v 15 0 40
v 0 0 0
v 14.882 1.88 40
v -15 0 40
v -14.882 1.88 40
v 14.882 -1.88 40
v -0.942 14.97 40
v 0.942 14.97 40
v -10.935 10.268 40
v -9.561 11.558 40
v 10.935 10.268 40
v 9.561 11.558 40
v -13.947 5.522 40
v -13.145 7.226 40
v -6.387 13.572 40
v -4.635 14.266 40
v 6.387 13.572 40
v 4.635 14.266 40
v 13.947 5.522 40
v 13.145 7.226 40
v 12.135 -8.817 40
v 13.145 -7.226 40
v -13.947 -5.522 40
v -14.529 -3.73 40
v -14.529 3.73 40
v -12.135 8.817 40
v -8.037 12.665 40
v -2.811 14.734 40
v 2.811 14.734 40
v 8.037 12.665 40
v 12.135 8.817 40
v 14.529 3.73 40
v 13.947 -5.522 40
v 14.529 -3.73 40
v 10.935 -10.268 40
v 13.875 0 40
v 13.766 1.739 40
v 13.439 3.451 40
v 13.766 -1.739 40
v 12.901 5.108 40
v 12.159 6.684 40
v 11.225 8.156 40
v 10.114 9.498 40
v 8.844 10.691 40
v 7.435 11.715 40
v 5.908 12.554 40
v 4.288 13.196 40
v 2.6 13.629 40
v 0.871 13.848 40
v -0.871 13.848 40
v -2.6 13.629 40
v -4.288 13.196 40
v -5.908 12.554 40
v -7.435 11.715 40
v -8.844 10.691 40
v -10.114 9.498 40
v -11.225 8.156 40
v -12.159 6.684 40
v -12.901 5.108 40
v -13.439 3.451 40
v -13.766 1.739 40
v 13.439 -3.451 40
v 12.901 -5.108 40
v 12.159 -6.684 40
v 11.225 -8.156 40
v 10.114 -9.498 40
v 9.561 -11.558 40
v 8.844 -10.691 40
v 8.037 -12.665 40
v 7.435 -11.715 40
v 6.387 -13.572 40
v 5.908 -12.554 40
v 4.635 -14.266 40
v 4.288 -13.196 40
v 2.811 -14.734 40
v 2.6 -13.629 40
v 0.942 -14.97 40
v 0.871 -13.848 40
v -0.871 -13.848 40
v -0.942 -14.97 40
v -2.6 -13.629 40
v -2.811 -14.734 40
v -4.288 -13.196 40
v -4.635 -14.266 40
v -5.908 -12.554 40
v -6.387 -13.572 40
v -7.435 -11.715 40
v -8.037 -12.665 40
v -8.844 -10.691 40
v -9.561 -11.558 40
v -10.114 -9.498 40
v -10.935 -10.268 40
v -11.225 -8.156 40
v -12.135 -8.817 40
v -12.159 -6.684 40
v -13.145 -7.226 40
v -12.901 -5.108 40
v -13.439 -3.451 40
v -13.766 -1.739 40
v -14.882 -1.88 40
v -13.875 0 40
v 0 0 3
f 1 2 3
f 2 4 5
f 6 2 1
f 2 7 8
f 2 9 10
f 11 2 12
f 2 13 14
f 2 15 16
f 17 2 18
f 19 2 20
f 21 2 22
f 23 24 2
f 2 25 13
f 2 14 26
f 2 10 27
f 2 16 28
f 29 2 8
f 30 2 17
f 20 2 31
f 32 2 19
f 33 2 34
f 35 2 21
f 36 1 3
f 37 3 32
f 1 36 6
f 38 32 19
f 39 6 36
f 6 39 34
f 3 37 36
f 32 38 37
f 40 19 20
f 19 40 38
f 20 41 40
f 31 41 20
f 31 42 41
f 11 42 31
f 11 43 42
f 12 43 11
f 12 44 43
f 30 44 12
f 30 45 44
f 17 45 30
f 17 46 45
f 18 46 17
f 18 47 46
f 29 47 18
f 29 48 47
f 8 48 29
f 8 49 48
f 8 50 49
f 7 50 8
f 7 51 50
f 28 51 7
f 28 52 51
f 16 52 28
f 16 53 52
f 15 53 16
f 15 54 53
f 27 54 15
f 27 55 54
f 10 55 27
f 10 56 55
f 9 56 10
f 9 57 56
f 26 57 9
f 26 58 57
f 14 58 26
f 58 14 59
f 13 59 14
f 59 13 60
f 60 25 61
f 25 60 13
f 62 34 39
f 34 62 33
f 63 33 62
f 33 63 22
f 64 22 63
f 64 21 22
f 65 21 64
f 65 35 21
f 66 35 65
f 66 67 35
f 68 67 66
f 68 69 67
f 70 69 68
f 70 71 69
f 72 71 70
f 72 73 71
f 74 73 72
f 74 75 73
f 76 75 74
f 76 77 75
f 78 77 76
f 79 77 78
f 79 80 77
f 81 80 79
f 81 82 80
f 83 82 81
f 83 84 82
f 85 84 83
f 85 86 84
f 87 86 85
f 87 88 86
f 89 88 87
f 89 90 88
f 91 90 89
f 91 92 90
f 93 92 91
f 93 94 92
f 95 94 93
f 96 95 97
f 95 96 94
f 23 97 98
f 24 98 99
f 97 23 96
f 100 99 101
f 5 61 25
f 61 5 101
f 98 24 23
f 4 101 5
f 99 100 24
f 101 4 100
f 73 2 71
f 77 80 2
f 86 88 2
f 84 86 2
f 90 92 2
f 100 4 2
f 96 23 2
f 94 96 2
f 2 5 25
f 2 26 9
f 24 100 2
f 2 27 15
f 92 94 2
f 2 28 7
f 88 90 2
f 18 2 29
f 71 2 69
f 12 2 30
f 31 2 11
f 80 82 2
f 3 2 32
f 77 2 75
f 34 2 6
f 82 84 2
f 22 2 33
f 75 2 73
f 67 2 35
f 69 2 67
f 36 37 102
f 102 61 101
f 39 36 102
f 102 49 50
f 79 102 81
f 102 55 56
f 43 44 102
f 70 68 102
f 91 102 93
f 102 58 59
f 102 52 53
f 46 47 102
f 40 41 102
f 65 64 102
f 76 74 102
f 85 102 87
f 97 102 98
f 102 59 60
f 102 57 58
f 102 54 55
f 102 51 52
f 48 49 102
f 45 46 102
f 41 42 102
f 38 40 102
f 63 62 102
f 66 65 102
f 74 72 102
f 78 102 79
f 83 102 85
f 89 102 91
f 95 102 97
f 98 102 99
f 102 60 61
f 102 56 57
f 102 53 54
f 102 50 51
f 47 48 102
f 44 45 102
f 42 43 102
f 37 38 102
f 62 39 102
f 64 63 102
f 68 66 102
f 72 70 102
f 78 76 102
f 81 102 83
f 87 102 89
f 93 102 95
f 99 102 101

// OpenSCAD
$fn = 50;

height = 40;
radius = 15;
shift = 3;

difference() {
    cylinder(h=height, r1=0, r2=radius);
    translate([0, 0, shift])
        cylinder(h=height, r1=0, r2=radius);
}
